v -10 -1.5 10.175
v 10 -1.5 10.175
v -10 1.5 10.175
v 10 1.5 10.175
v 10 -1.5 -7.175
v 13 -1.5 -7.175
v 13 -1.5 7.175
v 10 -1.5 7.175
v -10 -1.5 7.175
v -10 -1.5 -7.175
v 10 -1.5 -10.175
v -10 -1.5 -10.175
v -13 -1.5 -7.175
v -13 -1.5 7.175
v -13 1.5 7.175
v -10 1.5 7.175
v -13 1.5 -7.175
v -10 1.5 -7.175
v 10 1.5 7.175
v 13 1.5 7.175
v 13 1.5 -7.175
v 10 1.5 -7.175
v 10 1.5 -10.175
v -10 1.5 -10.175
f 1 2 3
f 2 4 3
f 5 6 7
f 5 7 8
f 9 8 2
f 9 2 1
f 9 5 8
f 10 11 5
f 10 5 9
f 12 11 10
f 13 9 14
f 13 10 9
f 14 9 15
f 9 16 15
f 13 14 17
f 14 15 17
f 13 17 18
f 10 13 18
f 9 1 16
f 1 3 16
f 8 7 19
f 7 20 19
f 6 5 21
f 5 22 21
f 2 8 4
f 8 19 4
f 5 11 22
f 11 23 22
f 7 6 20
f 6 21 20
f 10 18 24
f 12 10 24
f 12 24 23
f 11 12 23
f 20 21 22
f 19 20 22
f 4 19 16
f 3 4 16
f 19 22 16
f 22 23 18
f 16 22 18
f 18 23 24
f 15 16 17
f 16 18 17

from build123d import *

# Parameters (mm, degrees)
BOSS_EXTRUDE1_DEPTH = 1.5


with BuildPart() as part:
    # Sketch1 → Boss-Extrude1 (new body, symmetric)
    with BuildSketch(Plane(origin=(0, 0, 0), x_dir=(1, 0, 0), z_dir=(0, 1, 0))):
        Polygon((-10, 10.175), (10, 10.175), (10, 7.175), (13, 7.175), (13, -7.175), (10, -7.175), (10, -10.175), (-10, -10.175), (-10, -7.175), (-13, -7.175), (-13, 7.175), (-10, 7.175), align=None)
    extrude(amount=BOSS_EXTRUDE1_DEPTH, both=True)


solid = part.part
